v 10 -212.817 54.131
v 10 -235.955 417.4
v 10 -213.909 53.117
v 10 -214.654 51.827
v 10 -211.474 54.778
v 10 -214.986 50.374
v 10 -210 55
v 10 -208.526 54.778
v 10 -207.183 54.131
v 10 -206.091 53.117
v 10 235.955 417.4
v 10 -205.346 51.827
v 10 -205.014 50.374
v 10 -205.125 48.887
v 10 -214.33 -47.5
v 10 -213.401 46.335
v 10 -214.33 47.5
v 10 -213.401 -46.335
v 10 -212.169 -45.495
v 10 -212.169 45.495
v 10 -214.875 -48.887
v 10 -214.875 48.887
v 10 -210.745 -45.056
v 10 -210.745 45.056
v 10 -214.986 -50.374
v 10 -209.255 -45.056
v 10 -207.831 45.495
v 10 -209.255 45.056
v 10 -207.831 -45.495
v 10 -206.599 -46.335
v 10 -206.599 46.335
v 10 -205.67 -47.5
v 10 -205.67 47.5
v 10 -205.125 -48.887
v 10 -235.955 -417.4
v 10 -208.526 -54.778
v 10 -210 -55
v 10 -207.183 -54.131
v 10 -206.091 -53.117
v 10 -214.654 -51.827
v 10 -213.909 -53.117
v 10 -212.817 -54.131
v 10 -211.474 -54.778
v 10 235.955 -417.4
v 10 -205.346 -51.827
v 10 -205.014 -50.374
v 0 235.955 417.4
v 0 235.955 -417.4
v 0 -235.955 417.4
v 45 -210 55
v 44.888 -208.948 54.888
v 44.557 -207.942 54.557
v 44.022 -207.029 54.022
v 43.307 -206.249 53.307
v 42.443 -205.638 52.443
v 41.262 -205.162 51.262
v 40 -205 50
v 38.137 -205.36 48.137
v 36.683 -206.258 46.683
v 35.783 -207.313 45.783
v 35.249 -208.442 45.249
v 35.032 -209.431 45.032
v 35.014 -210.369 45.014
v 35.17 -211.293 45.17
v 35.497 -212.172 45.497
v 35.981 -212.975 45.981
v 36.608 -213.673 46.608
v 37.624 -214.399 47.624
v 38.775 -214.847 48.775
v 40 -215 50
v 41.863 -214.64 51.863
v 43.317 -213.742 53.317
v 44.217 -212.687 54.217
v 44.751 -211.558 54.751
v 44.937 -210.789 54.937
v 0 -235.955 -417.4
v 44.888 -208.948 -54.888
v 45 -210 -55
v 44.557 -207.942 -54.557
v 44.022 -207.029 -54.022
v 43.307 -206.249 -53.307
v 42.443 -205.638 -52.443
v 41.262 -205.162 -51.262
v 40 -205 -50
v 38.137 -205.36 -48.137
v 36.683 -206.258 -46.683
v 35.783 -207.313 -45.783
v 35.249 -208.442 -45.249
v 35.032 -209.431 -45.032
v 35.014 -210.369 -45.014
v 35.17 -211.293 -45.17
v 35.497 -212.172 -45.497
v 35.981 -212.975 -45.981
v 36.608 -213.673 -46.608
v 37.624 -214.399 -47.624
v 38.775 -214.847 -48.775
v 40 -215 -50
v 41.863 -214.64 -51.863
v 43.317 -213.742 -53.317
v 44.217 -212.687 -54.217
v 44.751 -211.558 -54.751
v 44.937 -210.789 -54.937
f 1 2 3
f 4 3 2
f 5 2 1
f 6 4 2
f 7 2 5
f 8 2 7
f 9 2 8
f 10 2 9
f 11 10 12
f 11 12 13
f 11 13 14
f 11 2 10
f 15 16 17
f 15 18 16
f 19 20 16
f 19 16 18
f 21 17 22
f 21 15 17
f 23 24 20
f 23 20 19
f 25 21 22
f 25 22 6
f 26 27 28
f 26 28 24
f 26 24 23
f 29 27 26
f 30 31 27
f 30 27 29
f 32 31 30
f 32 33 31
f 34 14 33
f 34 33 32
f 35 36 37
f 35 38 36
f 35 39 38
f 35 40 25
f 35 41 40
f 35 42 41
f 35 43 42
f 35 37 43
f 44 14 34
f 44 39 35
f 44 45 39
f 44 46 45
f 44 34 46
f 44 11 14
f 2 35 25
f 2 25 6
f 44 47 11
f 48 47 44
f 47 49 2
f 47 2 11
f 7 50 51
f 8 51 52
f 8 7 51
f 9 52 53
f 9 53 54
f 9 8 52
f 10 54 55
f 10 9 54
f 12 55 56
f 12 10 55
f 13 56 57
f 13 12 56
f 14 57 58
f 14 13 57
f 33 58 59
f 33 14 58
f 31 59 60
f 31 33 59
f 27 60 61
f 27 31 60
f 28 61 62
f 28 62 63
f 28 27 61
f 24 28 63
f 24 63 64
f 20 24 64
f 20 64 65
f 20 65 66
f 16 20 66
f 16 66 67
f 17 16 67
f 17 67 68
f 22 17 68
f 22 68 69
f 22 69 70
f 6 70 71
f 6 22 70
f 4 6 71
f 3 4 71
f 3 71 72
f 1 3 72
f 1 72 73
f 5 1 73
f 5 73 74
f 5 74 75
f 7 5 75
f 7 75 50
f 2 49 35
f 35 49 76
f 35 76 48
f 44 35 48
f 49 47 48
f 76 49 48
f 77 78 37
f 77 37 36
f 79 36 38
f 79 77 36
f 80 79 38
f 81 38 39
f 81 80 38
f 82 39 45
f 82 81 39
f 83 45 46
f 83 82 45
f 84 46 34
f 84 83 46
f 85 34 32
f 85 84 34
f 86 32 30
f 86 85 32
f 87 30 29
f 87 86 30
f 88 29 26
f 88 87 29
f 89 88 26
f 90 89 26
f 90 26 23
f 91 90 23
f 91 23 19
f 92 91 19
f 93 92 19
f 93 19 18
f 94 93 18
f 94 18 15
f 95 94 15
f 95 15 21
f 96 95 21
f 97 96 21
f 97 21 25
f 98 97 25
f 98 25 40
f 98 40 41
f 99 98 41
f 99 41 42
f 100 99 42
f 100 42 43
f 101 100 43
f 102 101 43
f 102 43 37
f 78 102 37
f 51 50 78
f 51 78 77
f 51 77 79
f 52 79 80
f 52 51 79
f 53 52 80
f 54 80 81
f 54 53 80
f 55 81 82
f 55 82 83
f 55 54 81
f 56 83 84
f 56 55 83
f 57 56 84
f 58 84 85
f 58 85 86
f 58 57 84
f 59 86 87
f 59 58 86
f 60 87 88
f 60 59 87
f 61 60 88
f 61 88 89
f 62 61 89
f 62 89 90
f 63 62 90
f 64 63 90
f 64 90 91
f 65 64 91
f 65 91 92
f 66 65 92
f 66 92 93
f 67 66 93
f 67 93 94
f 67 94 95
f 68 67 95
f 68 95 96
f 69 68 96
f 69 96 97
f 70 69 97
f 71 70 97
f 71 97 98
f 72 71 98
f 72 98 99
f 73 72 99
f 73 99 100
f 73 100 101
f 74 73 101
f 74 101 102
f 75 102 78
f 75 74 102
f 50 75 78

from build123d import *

# Parameters (mm, degrees)
SKETCH1_W           = 834.8
SKETCH1_H           = 471.91
BOSS_EXTRUDE1_DEPTH = 10
SKETCH2_R           = 5


with BuildPart() as part:
    # Sketch1 → Boss-Extrude1 (new body)
    with BuildSketch(Plane(origin=(0, 0, 0), x_dir=(0, 0, -1), z_dir=(1, 0, 0))):
        Rectangle(SKETCH1_W, SKETCH1_H)
    extrude(amount=BOSS_EXTRUDE1_DEPTH)

    # Sweep1: sweep along a curve in space
    with BuildLine() as sweep1_path:
        Line((10, -210, -50), (40, -210, -50))
        Line((40, -210, -50), (40, -210, 50))
        Line((10, -210, 50), (40, -210, 50))
    # Sketch2 → Sweep1 (sweep)
    with BuildSketch(Plane(origin=(10, 0, 0), x_dir=(0, 0, -1), z_dir=(1, 0, 0))):
        with Locations((50, -210)):
            Circle(SKETCH2_R)
    sweep(path=sweep1_path.line, transition=Transition.RIGHT)


solid = part.part
